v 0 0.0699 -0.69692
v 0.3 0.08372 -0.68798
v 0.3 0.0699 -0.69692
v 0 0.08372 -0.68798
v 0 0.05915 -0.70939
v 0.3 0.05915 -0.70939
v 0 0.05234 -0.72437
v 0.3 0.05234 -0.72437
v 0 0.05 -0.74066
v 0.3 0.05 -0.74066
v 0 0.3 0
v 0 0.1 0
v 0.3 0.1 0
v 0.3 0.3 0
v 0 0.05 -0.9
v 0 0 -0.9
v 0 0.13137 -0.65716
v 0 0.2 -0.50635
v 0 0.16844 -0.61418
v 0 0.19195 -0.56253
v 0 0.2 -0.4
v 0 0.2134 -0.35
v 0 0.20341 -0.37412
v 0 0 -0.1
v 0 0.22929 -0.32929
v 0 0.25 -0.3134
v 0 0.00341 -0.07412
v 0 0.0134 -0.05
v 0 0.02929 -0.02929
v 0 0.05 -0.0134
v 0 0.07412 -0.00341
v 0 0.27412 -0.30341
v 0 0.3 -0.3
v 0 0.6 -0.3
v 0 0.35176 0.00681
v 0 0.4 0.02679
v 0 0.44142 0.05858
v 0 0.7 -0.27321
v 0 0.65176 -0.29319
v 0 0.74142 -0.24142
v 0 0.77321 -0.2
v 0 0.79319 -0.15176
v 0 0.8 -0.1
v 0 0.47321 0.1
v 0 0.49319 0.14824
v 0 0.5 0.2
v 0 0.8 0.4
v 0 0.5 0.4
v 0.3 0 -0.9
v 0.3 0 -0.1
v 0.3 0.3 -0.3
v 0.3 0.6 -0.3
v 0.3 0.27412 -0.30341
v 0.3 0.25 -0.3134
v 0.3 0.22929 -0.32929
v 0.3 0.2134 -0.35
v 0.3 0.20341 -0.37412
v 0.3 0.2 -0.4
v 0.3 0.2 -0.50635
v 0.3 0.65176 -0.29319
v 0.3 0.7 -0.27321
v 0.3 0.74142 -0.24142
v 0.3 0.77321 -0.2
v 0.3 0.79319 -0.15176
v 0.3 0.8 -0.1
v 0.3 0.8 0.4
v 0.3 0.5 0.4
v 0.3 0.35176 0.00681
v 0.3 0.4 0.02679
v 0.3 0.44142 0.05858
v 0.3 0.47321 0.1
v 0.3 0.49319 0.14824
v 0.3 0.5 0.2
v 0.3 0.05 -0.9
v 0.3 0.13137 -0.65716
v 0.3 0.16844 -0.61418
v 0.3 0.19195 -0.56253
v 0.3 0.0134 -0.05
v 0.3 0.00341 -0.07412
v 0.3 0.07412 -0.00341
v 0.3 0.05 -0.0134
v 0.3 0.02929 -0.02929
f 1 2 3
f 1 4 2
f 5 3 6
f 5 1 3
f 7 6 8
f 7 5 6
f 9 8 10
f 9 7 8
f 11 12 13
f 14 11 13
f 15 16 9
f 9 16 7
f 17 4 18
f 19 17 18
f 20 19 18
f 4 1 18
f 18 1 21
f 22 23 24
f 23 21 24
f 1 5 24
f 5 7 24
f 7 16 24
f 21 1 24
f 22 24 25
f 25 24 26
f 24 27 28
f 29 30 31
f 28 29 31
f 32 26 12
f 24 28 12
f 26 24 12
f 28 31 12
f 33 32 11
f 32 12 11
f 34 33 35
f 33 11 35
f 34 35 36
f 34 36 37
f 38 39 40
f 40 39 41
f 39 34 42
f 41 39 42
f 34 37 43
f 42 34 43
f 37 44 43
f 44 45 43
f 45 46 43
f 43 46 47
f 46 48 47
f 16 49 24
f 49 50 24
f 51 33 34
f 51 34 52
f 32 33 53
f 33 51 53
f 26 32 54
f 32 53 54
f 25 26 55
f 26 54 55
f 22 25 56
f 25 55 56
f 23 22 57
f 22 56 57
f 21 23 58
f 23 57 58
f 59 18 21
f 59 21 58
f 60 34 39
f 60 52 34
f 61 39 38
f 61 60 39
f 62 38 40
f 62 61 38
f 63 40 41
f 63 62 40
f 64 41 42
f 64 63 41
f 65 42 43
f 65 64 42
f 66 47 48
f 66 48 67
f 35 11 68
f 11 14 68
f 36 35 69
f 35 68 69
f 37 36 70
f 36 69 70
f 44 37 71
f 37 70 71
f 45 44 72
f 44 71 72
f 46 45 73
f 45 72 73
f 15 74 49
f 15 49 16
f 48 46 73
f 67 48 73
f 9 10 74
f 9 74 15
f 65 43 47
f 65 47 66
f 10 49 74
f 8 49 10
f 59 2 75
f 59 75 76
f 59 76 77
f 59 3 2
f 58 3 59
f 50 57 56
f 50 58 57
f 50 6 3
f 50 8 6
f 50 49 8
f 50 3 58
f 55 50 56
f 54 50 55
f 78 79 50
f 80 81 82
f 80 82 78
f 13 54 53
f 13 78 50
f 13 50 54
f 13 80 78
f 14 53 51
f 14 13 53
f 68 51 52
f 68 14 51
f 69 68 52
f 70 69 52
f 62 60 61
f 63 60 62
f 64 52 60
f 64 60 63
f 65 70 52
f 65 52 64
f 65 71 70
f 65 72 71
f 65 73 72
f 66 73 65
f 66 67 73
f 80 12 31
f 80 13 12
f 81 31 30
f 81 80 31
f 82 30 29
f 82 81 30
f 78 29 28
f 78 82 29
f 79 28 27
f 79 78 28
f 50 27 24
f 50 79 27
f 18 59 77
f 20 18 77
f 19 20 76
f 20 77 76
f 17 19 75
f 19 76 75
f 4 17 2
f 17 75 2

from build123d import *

# Parameters (mm, degrees)
ESQUISSE1_W        = 0.3
ESQUISSE1_H        = 0.7
BOSS_EXTRU_1_DEPTH = 0.2
ESQUISSE2_W        = 0.3
ESQUISSE2_H        = 0.3
BOSS_EXTRU_2_DEPTH = 0.6
ESQUISSE3_W        = 0.3
ESQUISSE3_H        = 0.3
BOSS_EXTRU_3_DEPTH = 0.4
CONG_1_R           = 0.2
CONG_2_R           = 0.1
ESQUISSE4_W        = 0.3
ESQUISSE4_H        = 0.05
BOSS_EXTRU_4_DEPTH = 0.2
CONG_6_R           = 0.2
CONG_7_R           = 0.058


with BuildPart() as part:
    # Esquisse1 → Boss.-Extru.1 (new body)
    with BuildSketch(Plane(origin=(0, 0, 0), x_dir=(1, 0, 0), z_dir=(0, 1, 0))):
        with Locations((0.15, 0.35)):
            Rectangle(ESQUISSE1_W, ESQUISSE1_H)
    extrude(amount=BOSS_EXTRU_1_DEPTH)

    # Esquisse2 → Boss.-Extru.2 (add)
    with BuildSketch(Plane(origin=(0, 0.2, 0), x_dir=(1, 0, 0), z_dir=(0, 1, 0))):
        with Locations((0.15, 0.15)):
            Rectangle(ESQUISSE2_W, ESQUISSE2_H)
    extrude(amount=BOSS_EXTRU_2_DEPTH)

    # Esquisse3 → Boss.-Extru.3 (add)
    with BuildSketch(Plane.XY):
        with Locations((0.15, 0.65)):
            Rectangle(ESQUISSE3_W, ESQUISSE3_H)
    extrude(amount=BOSS_EXTRU_3_DEPTH)

    # Congé1
    cong_1_edges = [part.edges().sort_by_distance(p)[0] for p in [
        (0.15, 0.8, -0.3),
        (0.15, 0.5, 0),
    ]]
    fillet(cong_1_edges, radius=CONG_1_R)

    # Congé2
    cong_2_edges = [part.edges().sort_by_distance(p)[0] for p in [
        (0.15, 0.2, -0.3),
        (0.15, 0, 0),
    ]]
    fillet(cong_2_edges, radius=CONG_2_R)

    # Esquisse4 → Boss.-Extru.4 (add)
    with BuildSketch(Plane(origin=(0, 0, -0.7), x_dir=(-1, 0, 0), z_dir=(0, 0, -1))):
        with Locations((-0.15, 0.025)):
            Rectangle(ESQUISSE4_W, ESQUISSE4_H)
    extrude(amount=BOSS_EXTRU_4_DEPTH)

    # Congé6
    # the kernel refuses this fillet: 0.2 mm, written as the material it takes off along each edge
    with BuildSketch(Plane(origin=(0.784122918, 0.2, -0.7), x_dir=(0, -1.0, 3.7700213321171e-11), z_dir=(-1, 0, 0))) as cong_6_piece_1:
        with BuildLine():
            CenterArc((0.2, 0.193649167), CONG_6_R, 179.999999998, 75.522487815)
            Line((0, 0.193649167), (-0.004, 0.193649167))
            Line((-0.004, 0.193649167), (-0.004, 0))
            Line((-0.004, 0), (0, -0.004))
            ThreePointArc((0, -0.004), (0.075, -0.004), (0.149, -0.003872983))
            Line((0.149, -0.003872983), (0.15, 0))
        make_face()
    extrude(amount=1.268245837, mode=Mode.SUBTRACT)

    # Congé7
    cong_7_edges = [part.edges().sort_by_distance(p)[0] for p in [
        (0.15, 0.05, -0.7),
    ]]
    fillet(cong_7_edges, radius=CONG_7_R)


solid = part.part
